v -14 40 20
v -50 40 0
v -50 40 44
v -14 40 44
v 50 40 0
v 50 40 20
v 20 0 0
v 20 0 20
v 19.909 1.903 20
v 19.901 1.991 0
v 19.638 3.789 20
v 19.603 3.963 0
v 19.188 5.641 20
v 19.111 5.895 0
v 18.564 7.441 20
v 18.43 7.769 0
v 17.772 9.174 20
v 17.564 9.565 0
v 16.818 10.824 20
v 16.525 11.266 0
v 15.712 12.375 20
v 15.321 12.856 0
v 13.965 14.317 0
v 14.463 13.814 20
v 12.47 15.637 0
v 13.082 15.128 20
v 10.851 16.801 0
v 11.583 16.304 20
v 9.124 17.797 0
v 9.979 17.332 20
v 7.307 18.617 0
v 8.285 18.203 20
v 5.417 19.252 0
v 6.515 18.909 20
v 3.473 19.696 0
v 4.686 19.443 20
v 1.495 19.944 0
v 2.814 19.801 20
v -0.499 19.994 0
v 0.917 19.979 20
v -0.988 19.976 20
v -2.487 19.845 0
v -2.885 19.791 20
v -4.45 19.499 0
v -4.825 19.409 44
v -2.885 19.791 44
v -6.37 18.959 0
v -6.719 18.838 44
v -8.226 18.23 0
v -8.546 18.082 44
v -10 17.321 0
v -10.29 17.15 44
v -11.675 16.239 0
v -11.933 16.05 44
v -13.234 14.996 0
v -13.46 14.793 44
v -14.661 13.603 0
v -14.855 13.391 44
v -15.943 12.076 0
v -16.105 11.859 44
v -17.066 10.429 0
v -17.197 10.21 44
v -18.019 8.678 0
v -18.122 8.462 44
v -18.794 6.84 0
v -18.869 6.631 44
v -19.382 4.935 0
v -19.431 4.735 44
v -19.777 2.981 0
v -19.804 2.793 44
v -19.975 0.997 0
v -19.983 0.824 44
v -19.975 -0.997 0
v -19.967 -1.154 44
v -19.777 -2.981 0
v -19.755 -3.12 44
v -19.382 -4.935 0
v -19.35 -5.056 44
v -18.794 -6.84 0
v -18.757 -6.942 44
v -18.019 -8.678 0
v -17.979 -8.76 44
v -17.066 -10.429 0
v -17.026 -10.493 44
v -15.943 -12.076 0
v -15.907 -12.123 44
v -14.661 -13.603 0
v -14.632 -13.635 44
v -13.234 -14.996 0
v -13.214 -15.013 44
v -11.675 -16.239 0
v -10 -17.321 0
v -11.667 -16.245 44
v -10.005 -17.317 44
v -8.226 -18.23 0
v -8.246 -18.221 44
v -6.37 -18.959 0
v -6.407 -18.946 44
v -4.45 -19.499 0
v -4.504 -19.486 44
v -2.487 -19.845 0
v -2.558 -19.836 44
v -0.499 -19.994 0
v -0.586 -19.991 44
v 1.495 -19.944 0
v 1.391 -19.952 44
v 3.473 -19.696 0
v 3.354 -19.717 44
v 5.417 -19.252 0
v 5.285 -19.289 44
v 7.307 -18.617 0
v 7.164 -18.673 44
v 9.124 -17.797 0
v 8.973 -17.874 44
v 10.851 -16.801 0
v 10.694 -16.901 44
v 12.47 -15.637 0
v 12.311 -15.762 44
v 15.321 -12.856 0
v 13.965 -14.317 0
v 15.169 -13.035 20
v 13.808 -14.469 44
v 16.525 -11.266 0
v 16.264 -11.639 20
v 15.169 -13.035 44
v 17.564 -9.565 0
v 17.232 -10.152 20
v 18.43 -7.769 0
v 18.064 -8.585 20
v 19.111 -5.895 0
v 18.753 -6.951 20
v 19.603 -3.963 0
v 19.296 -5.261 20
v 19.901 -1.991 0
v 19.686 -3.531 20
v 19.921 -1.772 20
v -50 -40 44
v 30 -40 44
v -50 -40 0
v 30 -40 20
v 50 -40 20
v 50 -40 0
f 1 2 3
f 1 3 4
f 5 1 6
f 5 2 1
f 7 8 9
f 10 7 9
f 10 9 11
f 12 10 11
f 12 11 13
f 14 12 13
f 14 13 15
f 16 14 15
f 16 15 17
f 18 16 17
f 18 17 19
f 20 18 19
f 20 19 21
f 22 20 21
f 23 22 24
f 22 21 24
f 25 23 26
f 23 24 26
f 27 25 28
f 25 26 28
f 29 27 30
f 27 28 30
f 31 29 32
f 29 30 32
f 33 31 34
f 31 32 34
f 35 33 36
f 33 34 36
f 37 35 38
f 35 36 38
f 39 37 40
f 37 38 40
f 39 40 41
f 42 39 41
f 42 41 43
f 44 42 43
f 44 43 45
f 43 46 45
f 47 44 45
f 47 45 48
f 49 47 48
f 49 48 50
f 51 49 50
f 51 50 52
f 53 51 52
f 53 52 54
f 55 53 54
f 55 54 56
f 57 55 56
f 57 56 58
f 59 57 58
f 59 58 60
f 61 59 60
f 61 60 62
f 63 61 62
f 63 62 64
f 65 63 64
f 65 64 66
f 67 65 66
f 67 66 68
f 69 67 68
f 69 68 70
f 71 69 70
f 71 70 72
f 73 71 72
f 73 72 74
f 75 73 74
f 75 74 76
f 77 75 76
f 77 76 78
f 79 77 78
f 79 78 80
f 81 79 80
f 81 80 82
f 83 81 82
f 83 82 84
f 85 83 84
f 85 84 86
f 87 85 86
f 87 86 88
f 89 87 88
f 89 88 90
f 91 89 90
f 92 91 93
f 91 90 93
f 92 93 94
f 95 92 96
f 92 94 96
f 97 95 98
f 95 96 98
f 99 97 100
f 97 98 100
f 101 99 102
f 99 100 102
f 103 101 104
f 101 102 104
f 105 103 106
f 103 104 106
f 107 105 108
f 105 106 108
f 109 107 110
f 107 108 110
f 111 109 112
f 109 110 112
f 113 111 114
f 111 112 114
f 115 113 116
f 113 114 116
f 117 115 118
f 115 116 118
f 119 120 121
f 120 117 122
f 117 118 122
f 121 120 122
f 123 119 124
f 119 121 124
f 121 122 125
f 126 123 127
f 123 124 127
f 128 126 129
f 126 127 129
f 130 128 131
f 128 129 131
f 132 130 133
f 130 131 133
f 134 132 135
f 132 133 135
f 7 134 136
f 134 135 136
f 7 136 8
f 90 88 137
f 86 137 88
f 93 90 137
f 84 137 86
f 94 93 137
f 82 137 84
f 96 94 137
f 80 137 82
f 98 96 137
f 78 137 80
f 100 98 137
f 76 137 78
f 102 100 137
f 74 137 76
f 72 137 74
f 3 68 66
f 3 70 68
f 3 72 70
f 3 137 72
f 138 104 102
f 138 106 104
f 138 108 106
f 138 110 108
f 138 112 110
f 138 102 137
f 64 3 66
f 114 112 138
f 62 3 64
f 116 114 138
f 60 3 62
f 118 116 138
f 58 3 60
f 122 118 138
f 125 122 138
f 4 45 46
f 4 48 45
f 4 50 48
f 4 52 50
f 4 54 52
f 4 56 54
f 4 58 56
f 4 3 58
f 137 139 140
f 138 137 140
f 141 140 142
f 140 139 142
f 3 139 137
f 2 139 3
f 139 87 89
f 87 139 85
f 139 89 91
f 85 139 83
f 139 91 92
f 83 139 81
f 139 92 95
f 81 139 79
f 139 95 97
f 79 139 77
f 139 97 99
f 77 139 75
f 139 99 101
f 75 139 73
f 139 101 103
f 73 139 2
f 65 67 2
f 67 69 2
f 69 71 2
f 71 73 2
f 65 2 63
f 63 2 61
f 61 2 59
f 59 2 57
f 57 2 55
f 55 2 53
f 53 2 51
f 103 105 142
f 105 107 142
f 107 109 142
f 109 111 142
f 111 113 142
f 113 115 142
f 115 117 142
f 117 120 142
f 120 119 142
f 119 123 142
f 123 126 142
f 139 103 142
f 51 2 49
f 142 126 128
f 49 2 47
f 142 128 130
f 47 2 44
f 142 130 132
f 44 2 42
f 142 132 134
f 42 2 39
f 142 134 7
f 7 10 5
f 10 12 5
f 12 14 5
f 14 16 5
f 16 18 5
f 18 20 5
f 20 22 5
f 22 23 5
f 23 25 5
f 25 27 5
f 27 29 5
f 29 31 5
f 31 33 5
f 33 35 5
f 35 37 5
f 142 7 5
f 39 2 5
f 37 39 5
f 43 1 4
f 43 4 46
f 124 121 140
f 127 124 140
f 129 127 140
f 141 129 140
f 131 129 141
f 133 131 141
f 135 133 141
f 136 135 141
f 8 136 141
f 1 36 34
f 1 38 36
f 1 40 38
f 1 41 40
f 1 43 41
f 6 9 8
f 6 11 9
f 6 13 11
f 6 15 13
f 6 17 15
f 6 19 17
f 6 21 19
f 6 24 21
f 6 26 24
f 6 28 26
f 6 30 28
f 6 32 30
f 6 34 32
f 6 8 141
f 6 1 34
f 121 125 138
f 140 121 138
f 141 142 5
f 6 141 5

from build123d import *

# Parameters (mm, degrees)
F0_W     = 100
F0_H     = 80
F1_DEPTH = 44
F2_R     = 20
F3_DEPTH = 44.001
F5_DEPTH = 24


with BuildPart() as f1:
    # F0 (on Top) → F1 (new body)
    with BuildSketch(Plane.XY):
        Rectangle(F0_W, F0_H)
    extrude(amount=F1_DEPTH)

    # F2 (on face) → F3 (cut, through all)
    with BuildSketch(Plane.XY.offset(44)):
        Circle(F2_R)
    extrude(amount=-F3_DEPTH, mode=Mode.SUBTRACT)

    # F4 (on face) → F5 (cut)
    with BuildSketch(Plane.XY.offset(44)):
        Polygon((50, 40), (-14, 40), (30, -40), (50, -40), align=None)
    extrude(amount=-F5_DEPTH, mode=Mode.SUBTRACT)


solid = f1.part
